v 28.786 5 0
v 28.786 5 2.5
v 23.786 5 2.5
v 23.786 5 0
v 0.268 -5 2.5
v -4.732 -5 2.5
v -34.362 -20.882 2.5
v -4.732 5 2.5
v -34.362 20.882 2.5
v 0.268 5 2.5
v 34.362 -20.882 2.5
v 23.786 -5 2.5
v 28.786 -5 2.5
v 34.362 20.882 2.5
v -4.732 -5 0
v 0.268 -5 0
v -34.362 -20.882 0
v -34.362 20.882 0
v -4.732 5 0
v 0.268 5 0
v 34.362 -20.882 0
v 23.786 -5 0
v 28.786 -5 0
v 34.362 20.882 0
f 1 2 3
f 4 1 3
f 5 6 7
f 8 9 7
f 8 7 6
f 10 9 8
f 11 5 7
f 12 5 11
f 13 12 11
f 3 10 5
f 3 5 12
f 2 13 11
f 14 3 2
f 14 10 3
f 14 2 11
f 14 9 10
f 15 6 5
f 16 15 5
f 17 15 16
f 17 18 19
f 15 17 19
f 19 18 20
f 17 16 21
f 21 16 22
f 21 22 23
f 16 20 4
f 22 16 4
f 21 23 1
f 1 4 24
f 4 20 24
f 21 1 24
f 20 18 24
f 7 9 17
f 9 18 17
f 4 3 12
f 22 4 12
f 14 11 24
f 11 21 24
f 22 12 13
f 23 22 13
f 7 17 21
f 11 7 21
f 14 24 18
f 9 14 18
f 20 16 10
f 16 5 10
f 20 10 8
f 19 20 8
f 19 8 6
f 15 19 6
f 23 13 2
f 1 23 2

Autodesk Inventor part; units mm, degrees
ref_plane "YZ Plane" through (0, 0, 0) normal (1, 0, 0) x (0, 1, 0)
ref_plane "XZ Plane" through (0, 0, 0) normal (0, 1, 0) x (-1, 0, 0)
ref_plane "XY Plane" through (0, 0, 0) normal (0, 0, 1) x (1, 0, 0)
sketch "Sketch1" plane through (0, 0, 0) normal (0, 0, 1) x (1, 0, 0)
  line L0 (34.3625, 20.8815) -> (-34.3625, 20.8815)
  line L1 (-34.3625, 20.8815) -> (-34.3625, -20.8815)
  line L2 (-34.3625, -20.8815) -> (34.3625, -20.8815)
  line L3 (34.3625, -20.8815) -> (34.3625, 20.8815)
  point P0 (0, 0)
extrude "Extrusion1" add sketch "Sketch1" along normal blind 2.5
sketch "Sketch2" plane through (0, 0, 2.5) normal (0, 0, 1) x (1, 0, 0)
  line L0 (0.2675, 5) -> (-4.7325, 5)
  line L1 (-4.7325, 5) -> (-4.7325, -5)
  line L2 (-4.7325, -5) -> (0.2675, -5)
  line L3 (0.2675, -5) -> (0.2675, 5)
  line L4 (28.7855, 5) -> (23.7855, 5)
  line L5 (23.7855, 5) -> (23.7855, -5)
  line L6 (23.7855, -5) -> (28.7855, -5)
  line L7 (28.7855, -5) -> (28.7855, 5)
  point P0 (0, 0)
  point P1 (-2.2325, 0)
  point P2 (26.2855, 0)
extrude "Extrusion2" cut sketch "Sketch2" against normal blind 2.5
properties part number "tail plate"
